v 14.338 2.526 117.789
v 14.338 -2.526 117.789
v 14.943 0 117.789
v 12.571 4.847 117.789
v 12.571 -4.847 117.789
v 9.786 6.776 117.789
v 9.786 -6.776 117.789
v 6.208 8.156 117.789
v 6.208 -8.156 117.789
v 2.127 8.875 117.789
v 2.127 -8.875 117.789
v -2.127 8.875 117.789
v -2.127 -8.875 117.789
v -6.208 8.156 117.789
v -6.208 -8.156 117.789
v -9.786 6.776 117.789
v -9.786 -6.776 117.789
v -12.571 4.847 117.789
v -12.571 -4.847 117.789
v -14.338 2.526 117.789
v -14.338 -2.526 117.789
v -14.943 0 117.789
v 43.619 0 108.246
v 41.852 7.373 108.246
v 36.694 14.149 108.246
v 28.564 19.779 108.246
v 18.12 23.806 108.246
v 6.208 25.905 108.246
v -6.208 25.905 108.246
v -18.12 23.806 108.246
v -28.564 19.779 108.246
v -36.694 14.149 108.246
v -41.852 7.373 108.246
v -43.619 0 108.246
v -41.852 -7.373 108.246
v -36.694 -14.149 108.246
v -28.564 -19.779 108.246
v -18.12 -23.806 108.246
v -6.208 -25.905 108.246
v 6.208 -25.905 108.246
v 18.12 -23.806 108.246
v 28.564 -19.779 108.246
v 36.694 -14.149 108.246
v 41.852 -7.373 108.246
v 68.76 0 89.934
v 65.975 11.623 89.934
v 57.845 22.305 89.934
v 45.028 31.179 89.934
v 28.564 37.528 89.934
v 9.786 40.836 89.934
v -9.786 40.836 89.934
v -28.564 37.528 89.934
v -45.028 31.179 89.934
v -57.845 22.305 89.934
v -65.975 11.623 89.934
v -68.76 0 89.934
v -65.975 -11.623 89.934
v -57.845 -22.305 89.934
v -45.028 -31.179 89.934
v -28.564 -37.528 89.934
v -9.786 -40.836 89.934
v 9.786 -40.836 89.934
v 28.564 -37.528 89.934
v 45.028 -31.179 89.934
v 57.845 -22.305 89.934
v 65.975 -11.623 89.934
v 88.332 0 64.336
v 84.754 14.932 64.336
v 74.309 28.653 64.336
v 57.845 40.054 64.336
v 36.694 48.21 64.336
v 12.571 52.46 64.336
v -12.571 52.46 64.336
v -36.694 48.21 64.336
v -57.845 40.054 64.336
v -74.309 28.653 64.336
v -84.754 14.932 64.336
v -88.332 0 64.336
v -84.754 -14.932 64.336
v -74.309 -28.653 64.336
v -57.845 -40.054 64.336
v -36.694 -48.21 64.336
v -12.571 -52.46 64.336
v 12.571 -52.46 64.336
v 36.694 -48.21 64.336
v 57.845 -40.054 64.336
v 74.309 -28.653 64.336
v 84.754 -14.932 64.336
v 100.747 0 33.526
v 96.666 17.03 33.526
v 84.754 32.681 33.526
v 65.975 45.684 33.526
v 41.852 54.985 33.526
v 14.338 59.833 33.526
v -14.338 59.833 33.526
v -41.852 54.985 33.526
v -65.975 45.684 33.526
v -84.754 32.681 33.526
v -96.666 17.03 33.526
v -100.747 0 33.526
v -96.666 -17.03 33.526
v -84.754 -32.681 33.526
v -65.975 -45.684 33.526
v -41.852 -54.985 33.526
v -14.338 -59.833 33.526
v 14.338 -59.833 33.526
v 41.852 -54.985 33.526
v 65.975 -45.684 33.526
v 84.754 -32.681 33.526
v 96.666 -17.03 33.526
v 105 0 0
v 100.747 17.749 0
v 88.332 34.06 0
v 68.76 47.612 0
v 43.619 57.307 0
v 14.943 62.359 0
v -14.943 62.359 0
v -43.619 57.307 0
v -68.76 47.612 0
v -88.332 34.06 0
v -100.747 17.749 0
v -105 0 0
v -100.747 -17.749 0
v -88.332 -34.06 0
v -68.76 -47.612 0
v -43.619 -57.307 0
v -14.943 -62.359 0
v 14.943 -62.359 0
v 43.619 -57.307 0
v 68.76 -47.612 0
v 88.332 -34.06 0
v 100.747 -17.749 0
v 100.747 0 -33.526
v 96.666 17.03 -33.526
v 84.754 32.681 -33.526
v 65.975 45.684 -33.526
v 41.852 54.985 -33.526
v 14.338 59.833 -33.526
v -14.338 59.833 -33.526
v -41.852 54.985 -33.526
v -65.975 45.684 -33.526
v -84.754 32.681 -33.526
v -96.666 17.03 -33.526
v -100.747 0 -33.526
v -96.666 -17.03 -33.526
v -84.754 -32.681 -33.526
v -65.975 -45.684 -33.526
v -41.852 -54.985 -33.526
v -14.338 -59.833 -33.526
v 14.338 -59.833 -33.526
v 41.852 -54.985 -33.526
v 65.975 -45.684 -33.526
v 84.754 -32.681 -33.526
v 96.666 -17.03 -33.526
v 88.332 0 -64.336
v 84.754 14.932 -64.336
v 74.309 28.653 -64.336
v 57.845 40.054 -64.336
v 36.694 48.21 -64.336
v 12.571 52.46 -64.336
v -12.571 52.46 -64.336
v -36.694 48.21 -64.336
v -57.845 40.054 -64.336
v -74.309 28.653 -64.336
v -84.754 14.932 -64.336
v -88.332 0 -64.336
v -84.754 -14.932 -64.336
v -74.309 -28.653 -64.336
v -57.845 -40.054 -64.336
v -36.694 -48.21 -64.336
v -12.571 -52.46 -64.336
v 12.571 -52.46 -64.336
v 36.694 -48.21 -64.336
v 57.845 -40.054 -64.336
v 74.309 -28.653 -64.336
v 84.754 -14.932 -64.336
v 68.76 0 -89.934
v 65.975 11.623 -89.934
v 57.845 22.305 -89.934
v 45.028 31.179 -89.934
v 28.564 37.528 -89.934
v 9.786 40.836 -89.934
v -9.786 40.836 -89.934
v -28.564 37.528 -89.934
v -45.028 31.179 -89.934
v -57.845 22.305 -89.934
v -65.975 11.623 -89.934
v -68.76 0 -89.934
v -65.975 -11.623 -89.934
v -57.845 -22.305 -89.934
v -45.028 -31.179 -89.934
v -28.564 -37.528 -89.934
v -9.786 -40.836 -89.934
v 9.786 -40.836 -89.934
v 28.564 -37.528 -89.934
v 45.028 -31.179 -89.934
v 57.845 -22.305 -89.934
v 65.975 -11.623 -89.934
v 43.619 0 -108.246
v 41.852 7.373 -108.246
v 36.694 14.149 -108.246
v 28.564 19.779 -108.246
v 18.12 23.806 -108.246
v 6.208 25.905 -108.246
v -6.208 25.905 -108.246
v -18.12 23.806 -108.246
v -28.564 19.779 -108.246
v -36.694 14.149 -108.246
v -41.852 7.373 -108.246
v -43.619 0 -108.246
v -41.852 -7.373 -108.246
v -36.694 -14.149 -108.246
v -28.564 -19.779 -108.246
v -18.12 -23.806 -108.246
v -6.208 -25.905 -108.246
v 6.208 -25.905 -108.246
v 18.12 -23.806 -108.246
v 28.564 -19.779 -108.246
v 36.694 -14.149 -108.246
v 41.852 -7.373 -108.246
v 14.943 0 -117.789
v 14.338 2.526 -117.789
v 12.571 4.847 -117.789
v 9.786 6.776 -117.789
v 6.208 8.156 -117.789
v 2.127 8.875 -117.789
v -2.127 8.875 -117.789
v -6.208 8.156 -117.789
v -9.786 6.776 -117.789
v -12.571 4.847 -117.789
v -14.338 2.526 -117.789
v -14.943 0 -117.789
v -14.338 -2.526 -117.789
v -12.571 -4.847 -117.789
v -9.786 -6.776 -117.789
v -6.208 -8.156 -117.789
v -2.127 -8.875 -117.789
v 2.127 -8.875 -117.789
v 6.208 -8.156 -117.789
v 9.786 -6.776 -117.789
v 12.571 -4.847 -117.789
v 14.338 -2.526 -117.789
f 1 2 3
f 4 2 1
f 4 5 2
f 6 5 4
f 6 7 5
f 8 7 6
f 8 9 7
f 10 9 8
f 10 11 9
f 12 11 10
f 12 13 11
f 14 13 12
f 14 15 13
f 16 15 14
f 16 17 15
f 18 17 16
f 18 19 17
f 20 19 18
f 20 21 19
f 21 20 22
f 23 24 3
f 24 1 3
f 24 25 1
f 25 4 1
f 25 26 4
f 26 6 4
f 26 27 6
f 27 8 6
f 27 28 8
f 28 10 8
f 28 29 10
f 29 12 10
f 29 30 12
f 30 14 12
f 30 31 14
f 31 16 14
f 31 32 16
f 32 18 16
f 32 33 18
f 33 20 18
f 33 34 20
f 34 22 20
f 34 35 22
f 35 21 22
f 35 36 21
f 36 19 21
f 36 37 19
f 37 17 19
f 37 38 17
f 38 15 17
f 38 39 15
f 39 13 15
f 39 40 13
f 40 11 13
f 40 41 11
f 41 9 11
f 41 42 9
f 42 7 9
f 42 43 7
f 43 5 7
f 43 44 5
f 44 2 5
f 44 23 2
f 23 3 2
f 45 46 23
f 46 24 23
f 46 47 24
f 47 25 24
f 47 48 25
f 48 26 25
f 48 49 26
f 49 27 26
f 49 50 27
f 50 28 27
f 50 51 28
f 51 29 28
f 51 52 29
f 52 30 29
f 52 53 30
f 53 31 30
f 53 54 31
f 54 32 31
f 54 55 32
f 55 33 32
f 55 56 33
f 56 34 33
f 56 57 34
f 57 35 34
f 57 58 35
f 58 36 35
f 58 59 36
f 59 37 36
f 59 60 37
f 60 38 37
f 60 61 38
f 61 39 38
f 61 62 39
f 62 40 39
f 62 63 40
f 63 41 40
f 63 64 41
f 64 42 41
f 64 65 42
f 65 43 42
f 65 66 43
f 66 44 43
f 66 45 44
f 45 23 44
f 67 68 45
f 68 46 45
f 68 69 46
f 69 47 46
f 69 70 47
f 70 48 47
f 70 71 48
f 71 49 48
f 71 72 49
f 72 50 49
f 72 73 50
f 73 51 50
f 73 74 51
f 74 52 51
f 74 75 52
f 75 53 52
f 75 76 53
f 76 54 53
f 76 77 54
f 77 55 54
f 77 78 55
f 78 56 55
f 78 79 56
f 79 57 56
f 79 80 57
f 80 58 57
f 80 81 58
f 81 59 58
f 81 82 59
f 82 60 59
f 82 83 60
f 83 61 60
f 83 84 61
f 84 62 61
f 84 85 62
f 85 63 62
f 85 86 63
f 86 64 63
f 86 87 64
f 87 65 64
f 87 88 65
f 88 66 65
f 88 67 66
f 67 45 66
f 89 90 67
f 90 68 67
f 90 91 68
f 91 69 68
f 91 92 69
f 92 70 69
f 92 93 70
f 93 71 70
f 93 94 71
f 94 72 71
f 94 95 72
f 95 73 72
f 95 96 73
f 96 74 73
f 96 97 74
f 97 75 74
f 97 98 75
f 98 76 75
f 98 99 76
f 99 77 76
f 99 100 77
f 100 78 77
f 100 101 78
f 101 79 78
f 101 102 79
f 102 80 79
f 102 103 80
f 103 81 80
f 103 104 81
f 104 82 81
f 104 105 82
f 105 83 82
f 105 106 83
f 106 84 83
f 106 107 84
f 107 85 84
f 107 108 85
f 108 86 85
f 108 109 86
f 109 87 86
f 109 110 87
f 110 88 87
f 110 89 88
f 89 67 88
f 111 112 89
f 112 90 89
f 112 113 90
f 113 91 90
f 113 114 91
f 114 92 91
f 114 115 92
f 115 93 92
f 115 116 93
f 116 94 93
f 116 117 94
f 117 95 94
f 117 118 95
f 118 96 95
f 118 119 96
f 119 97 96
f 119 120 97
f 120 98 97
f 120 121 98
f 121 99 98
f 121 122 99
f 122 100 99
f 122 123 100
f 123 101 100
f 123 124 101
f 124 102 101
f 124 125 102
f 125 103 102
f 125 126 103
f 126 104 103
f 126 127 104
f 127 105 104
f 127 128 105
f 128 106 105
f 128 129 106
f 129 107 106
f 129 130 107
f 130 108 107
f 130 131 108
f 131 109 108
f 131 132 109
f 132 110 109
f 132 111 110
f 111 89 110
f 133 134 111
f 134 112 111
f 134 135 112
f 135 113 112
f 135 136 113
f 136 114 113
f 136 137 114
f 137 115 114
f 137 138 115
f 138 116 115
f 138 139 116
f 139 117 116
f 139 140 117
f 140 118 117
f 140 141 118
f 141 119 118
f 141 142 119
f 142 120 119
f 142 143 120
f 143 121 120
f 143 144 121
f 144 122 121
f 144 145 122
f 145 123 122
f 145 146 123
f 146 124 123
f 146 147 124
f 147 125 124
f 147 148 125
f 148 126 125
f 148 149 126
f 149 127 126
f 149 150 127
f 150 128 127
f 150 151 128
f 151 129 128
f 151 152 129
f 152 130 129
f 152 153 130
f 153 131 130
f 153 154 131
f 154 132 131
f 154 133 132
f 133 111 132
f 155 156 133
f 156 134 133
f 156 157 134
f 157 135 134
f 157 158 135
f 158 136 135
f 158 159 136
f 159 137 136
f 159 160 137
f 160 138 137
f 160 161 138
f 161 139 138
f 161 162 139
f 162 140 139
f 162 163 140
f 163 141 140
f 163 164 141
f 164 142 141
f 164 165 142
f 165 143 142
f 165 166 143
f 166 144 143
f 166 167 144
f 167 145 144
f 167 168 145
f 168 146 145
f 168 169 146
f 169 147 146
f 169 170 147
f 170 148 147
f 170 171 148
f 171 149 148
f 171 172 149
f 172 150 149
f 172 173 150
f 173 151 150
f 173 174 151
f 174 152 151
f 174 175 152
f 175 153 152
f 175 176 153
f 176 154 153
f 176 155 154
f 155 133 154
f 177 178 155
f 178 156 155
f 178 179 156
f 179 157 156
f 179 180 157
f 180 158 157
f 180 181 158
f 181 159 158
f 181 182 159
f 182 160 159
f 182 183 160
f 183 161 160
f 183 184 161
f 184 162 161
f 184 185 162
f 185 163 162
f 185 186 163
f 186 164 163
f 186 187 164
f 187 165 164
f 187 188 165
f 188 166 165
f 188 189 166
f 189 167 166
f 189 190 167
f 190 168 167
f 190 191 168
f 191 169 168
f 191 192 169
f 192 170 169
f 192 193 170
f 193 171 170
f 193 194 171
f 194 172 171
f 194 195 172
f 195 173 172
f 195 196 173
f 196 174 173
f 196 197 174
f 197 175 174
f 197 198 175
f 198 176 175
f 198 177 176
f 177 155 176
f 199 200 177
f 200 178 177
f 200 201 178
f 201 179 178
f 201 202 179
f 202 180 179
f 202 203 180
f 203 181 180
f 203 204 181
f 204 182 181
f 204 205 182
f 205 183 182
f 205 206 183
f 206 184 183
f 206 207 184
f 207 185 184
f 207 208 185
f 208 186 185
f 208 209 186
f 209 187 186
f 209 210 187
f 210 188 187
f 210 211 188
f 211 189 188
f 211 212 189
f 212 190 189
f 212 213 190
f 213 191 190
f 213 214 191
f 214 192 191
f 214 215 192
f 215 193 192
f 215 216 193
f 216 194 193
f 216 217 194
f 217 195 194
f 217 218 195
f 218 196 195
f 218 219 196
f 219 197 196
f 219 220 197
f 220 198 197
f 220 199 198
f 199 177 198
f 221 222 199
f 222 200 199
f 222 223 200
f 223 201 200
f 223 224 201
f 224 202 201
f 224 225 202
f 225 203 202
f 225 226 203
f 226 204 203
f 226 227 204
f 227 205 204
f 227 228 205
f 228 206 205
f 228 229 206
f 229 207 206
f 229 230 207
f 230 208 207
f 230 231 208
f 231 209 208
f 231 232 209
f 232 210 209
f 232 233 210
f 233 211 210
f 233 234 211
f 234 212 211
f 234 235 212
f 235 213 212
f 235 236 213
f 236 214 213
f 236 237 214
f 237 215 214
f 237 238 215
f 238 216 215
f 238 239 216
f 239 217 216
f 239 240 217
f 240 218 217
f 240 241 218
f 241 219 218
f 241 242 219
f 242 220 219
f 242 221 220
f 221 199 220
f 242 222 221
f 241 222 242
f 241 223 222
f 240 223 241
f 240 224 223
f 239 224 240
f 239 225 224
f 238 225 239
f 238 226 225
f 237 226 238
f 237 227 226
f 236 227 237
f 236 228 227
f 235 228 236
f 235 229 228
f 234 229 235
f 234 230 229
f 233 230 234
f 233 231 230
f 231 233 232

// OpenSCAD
// Generated by SolidPython 1.0.1 on 2020-07-29 00:46:52


scale(v = [15, 9, 17]) {
	sphere(r = 7);
}
/***********************************************
*********      SolidPython code:      **********
************************************************
 
# import packages: SolidPython
from solid import *
from solid.utils import *
from itertools import chain, combinations, permutations


class Resize:

    def __init__(self, scad_file):
        self.scad_file = scad_file
        #self.scad_file = import_scad(scad_file)
        # cone/cylinder param:
        self.r1 = 0
        self.r2 = 0
        self.h = 0
        # rectangular prism param:
        self.w = 0
        self.l = 0
        # ellipse param:
        self.r = 0

    # import OpenScad code (file name corresponds to shape)


    # classify shape + parameters
    def assign(self, param1, param2, param3):
        if self.scad_file == 'cone.scad':
            self.r1 = param1
            self.r2 = param2
            self.h = param3
        elif self.scad_file == 'cylinder.scad':
            self.r1 = param1
            self.r2 = param2
            self.h = param3
        elif self.scad_file == 'rectangularPrism.scad':
            self.h = param1
            self.l = param2
            self.w = param3
        else:
            self.r = param1
            self.h = param2

    # resize parameters
    def iterate(self):
        x = range(3, 20, 2)
        i = 1
        if self.scad_file == 'cone.scad':
            tempList = list(permutations(x, 2))
            for temp in tempList:
                param1 = temp[0]
                param2 = temp[1]
                filepath = 'produced_scad_files/' + 'cone' + str(param1) + '_' + str(param2) + '_' + '.scad'
                scad_render_to_file(cylinder(h=param1, r1=param2, r2=0), filepath)

        elif self.scad_file == 'cylinder.scad':
            tempList = list(permutations(x, 3))
            for temp in tempList:
                param1 = temp[0]
                param2 = temp[1]
                filepath = 'produced_scad_files/' + 'cylinder' + str(param1) + '_' + str(param2) + '_' + '.scad'
                scad_render_to_file(cylinder(h=param1, r1=param2, r2=param2), filepath)

        elif self.scad_file == 'rectangularPrism.scad':
            tempList = list(permutations(x, 3))
            for temp in tempList:
                param1 = temp[0]
                param2 = temp[1]
                param3 = temp[2]
                filepath = 'produced_scad_files/' + 'rectangularPrism' + str(param1) + '_' + str(param2) + '_' + str(
                    param3) + '.scad'
                scad_render_to_file(cube(size=(param1, param2, param3)), filepath)

        elif self.scad_file == 'ellipse.scad':
            tempList = list(permutations(x, 4))
            for temp in tempList:
                param1 = temp[0]
                param2 = temp[1]
                param3 = temp[2]
                param4 = temp[3]
                filepath = 'produced_scad_files/' + 'ellipse' + str(param1) + '_' + str(param2) + '_' + str(param3) + '_' + str(param4) + '.scad'
                scad_render_to_file(scale([param1, param2, param3])(sphere(r=param4)), filepath)

    def render_to_scadfile(self):
        scad_render_to_file(scad, 'example.scad') 
 
************************************************/
